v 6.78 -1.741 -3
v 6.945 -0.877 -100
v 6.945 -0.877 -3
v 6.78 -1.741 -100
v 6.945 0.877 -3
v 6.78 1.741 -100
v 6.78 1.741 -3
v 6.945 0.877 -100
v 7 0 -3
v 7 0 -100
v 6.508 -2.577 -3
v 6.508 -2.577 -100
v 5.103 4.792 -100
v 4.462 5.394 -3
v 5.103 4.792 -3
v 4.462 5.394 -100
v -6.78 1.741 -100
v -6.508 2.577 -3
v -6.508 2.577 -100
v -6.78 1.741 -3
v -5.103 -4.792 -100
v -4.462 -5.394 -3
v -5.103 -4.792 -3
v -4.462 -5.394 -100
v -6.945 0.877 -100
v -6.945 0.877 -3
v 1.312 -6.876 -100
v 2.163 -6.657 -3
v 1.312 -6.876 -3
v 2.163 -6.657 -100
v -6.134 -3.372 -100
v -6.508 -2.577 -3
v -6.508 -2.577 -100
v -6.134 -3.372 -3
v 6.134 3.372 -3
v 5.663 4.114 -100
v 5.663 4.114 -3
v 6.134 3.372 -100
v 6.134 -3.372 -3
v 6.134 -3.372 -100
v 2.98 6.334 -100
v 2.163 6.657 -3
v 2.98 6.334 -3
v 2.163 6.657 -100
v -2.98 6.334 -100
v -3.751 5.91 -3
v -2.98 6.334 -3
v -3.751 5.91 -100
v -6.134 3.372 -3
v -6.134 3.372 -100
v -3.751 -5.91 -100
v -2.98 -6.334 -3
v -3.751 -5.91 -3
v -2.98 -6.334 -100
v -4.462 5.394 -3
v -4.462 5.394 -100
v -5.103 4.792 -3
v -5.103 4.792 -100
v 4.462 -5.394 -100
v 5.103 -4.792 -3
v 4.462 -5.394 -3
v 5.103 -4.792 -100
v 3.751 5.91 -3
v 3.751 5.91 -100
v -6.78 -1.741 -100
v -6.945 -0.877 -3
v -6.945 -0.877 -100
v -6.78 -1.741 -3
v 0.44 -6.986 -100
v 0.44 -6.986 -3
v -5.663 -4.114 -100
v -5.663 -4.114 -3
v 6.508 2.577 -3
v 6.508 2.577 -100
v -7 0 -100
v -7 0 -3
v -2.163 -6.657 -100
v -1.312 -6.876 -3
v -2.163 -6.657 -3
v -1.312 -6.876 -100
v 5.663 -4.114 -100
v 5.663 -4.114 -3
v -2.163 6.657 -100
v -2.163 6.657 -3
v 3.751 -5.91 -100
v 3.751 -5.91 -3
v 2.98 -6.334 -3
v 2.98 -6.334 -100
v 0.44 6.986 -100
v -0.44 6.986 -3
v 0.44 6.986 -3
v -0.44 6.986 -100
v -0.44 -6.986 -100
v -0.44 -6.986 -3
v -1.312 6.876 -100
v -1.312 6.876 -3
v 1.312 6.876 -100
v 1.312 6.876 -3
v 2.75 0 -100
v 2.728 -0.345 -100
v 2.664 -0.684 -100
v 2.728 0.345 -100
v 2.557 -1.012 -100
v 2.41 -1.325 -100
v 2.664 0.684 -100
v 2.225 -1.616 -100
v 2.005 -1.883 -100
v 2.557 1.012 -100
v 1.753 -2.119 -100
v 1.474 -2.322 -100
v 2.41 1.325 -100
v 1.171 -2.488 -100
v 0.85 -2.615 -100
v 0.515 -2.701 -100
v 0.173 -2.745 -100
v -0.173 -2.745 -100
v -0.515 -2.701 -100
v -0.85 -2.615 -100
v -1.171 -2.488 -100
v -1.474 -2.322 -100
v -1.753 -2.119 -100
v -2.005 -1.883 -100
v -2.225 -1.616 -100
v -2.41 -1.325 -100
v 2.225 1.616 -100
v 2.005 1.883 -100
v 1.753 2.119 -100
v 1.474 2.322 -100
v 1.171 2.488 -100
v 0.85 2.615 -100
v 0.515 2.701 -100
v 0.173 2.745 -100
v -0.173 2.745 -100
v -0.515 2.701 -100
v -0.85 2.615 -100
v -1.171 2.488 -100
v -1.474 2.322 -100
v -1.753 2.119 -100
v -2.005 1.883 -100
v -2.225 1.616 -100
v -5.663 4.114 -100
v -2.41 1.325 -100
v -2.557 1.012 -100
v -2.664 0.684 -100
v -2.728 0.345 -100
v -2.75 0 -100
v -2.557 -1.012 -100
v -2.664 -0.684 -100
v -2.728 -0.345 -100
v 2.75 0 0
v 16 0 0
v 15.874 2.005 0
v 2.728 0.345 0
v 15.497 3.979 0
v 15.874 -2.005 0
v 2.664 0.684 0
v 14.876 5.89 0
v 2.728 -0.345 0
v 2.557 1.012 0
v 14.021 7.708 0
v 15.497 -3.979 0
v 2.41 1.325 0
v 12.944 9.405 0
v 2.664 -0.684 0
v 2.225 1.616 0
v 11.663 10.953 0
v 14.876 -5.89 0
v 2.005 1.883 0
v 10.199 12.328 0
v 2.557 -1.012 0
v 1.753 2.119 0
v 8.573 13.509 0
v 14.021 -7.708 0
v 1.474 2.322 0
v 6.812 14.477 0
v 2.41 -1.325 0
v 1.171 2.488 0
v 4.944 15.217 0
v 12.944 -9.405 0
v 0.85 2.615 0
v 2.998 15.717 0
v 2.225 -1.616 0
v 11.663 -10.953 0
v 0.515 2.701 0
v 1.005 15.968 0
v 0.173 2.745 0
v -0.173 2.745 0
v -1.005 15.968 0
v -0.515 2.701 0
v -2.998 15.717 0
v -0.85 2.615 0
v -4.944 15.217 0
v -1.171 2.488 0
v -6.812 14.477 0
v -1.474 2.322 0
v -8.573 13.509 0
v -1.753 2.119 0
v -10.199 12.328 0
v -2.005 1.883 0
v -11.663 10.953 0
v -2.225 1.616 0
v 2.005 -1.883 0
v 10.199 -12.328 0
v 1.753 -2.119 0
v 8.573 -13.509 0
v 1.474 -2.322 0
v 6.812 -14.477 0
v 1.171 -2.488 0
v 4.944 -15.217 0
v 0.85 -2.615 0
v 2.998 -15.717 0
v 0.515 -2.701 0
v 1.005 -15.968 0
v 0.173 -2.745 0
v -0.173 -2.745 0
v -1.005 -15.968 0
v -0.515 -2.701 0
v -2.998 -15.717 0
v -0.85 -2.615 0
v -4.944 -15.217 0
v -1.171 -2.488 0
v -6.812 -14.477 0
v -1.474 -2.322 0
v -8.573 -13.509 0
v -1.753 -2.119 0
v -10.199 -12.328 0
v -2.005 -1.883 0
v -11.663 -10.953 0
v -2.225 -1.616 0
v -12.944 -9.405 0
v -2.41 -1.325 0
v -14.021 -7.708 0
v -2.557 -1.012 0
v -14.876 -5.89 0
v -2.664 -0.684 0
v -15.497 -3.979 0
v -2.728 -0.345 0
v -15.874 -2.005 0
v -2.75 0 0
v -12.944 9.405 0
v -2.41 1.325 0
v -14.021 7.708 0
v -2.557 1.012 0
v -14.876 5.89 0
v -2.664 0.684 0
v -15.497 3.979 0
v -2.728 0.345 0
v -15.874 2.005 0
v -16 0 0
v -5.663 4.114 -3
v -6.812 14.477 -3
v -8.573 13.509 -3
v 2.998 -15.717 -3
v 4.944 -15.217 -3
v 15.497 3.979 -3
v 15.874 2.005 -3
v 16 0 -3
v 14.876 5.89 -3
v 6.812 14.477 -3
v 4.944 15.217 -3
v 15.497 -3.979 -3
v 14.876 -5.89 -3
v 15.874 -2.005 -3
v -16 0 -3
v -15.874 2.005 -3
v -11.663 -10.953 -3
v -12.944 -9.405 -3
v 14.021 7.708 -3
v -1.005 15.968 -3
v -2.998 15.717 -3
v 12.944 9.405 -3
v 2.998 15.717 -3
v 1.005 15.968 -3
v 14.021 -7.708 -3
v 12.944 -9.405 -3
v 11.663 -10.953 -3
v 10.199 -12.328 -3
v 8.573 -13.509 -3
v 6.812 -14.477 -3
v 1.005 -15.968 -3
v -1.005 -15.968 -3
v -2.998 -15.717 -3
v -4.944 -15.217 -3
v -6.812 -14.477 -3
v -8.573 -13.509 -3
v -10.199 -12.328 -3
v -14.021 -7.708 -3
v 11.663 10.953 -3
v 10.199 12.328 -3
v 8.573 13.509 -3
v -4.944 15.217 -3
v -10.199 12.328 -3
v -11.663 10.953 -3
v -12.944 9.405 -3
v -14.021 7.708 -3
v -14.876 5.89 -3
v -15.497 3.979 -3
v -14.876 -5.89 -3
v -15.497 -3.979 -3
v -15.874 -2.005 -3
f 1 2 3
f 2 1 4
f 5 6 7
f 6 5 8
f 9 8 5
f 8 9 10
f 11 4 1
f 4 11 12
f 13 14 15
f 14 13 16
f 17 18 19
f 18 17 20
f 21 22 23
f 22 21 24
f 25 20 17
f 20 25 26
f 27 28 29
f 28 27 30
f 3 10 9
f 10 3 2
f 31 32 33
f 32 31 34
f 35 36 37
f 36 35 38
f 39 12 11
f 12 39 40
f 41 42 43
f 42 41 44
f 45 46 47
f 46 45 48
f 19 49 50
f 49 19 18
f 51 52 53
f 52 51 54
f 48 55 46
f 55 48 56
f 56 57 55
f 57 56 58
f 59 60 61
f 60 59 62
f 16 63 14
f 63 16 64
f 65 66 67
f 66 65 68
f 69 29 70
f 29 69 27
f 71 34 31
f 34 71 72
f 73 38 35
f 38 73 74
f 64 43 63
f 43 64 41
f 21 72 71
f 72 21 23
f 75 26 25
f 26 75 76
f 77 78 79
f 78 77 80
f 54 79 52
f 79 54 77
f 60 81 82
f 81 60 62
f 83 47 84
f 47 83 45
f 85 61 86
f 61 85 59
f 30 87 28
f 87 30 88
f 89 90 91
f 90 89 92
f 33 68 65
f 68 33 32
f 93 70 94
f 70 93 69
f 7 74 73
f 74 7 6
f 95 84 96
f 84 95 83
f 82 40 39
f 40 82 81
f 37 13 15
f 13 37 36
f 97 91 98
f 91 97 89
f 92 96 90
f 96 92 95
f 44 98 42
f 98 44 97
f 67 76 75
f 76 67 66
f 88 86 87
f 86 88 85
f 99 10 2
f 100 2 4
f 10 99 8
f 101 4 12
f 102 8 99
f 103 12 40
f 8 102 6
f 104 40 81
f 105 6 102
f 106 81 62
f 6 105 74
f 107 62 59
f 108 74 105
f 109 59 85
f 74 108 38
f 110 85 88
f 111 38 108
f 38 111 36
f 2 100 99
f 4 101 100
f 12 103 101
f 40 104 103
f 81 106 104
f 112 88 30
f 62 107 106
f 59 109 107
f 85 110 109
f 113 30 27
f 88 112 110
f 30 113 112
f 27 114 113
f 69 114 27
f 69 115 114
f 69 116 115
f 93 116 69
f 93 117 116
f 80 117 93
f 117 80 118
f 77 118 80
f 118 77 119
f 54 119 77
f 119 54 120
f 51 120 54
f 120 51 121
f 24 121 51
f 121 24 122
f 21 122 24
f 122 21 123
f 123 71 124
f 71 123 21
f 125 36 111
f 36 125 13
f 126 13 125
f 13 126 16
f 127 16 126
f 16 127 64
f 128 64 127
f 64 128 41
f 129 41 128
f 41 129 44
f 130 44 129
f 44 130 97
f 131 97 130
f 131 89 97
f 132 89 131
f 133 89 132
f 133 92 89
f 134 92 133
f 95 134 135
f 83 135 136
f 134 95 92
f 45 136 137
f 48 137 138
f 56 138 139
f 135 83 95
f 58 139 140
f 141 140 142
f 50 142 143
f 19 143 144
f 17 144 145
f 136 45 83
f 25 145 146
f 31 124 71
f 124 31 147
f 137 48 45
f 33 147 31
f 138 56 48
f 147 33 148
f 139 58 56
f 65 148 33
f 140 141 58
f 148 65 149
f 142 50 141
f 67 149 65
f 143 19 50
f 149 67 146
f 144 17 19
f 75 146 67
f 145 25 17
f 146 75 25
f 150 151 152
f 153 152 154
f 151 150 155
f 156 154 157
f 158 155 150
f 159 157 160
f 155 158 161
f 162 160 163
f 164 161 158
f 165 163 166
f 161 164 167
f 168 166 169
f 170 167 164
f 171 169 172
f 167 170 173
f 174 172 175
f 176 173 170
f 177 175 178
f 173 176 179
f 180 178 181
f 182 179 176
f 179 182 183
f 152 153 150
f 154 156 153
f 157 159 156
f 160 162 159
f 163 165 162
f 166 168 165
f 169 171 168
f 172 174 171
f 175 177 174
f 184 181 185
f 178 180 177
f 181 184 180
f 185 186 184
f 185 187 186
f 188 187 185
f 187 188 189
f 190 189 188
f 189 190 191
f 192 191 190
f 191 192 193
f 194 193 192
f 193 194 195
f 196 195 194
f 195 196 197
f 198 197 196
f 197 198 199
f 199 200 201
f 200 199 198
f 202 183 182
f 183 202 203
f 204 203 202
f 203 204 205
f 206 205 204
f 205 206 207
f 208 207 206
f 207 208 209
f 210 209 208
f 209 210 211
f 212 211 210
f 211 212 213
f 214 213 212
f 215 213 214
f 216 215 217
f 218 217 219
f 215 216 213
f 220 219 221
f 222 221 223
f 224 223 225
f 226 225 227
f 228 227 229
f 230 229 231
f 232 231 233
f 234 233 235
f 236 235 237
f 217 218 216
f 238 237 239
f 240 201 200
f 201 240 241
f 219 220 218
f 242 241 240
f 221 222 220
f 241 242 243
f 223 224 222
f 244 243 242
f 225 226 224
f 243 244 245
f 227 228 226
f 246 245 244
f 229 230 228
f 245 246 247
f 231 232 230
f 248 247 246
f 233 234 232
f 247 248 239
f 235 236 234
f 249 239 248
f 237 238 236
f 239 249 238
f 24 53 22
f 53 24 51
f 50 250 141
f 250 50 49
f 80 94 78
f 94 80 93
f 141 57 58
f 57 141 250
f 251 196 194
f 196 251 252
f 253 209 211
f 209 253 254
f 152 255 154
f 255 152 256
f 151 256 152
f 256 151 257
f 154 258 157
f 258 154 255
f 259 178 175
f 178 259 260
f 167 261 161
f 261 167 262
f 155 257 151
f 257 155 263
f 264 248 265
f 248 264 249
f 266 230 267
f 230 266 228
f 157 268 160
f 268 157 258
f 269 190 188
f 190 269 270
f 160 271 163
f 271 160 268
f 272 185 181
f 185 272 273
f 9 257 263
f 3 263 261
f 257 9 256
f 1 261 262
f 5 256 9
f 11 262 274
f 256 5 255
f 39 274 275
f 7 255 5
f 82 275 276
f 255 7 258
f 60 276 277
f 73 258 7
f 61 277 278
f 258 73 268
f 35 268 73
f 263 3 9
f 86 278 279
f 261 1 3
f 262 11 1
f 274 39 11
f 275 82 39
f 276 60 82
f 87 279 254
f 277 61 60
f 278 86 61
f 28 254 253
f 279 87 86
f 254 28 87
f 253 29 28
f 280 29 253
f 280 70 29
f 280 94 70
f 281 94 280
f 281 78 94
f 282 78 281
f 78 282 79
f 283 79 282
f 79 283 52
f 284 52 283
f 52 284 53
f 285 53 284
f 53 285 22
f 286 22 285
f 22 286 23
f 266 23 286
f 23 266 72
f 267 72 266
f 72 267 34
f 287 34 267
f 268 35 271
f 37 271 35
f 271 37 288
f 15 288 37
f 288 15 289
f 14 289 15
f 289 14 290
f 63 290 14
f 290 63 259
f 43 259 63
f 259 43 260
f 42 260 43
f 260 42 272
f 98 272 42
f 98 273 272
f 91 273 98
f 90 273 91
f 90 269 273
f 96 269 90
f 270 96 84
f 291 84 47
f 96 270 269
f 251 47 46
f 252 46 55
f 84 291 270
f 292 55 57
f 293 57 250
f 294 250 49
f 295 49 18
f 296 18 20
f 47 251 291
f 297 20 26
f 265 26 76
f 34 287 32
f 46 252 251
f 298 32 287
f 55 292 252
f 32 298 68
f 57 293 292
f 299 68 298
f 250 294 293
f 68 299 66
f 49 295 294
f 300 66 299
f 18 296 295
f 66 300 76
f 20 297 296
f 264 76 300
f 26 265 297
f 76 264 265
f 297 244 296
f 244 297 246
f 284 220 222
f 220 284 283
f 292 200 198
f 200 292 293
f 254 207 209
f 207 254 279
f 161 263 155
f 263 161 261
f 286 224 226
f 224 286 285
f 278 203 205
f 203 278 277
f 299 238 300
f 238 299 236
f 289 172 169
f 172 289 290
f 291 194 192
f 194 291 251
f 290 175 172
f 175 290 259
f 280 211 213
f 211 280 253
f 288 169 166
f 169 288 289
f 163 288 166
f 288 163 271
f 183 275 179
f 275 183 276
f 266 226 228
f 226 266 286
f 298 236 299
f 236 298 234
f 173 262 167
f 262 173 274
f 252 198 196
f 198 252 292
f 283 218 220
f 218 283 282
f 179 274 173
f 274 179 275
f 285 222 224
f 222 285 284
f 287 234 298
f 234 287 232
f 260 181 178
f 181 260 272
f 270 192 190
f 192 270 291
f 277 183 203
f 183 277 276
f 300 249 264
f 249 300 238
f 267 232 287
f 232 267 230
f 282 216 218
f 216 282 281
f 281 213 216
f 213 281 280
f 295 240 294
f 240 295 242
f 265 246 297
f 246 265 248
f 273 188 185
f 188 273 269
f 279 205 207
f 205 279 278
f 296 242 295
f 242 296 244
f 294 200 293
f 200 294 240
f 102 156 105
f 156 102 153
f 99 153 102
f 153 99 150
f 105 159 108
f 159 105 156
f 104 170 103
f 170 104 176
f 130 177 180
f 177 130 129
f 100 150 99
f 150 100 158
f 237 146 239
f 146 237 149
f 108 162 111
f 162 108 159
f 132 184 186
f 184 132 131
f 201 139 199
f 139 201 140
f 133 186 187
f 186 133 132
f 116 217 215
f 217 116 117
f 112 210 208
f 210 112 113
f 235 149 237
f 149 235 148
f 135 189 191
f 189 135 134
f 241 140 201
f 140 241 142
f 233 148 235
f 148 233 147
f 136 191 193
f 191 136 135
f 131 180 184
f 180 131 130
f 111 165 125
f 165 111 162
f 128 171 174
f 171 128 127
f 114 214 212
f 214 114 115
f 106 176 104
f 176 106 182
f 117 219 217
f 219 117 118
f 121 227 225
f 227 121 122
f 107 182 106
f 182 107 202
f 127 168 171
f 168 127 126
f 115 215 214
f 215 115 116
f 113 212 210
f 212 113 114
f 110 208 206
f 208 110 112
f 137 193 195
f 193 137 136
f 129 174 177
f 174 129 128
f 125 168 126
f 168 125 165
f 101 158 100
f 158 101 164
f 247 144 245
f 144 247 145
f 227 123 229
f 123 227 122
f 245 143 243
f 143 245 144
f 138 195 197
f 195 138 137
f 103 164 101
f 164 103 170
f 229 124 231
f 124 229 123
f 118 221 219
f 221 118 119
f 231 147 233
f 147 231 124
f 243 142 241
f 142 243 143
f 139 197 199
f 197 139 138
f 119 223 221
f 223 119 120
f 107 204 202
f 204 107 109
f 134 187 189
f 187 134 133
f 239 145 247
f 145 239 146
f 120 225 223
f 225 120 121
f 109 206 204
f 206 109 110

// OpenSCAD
$fn = 50;


difference() {
	union() {
		translate(v = [0, 0, -100.0000000000]) {
			cylinder(h = 100, r = 7.0000000000);
		}
		translate(v = [0, 0, -3.0000000000]) {
			cylinder(h = 3, r = 16.0000000000);
		}
	}
	union() {
		#translate(v = [0, 0, -100]) {
			cylinder(h = 100, r = 2.7500000000);
		}
	}
}
